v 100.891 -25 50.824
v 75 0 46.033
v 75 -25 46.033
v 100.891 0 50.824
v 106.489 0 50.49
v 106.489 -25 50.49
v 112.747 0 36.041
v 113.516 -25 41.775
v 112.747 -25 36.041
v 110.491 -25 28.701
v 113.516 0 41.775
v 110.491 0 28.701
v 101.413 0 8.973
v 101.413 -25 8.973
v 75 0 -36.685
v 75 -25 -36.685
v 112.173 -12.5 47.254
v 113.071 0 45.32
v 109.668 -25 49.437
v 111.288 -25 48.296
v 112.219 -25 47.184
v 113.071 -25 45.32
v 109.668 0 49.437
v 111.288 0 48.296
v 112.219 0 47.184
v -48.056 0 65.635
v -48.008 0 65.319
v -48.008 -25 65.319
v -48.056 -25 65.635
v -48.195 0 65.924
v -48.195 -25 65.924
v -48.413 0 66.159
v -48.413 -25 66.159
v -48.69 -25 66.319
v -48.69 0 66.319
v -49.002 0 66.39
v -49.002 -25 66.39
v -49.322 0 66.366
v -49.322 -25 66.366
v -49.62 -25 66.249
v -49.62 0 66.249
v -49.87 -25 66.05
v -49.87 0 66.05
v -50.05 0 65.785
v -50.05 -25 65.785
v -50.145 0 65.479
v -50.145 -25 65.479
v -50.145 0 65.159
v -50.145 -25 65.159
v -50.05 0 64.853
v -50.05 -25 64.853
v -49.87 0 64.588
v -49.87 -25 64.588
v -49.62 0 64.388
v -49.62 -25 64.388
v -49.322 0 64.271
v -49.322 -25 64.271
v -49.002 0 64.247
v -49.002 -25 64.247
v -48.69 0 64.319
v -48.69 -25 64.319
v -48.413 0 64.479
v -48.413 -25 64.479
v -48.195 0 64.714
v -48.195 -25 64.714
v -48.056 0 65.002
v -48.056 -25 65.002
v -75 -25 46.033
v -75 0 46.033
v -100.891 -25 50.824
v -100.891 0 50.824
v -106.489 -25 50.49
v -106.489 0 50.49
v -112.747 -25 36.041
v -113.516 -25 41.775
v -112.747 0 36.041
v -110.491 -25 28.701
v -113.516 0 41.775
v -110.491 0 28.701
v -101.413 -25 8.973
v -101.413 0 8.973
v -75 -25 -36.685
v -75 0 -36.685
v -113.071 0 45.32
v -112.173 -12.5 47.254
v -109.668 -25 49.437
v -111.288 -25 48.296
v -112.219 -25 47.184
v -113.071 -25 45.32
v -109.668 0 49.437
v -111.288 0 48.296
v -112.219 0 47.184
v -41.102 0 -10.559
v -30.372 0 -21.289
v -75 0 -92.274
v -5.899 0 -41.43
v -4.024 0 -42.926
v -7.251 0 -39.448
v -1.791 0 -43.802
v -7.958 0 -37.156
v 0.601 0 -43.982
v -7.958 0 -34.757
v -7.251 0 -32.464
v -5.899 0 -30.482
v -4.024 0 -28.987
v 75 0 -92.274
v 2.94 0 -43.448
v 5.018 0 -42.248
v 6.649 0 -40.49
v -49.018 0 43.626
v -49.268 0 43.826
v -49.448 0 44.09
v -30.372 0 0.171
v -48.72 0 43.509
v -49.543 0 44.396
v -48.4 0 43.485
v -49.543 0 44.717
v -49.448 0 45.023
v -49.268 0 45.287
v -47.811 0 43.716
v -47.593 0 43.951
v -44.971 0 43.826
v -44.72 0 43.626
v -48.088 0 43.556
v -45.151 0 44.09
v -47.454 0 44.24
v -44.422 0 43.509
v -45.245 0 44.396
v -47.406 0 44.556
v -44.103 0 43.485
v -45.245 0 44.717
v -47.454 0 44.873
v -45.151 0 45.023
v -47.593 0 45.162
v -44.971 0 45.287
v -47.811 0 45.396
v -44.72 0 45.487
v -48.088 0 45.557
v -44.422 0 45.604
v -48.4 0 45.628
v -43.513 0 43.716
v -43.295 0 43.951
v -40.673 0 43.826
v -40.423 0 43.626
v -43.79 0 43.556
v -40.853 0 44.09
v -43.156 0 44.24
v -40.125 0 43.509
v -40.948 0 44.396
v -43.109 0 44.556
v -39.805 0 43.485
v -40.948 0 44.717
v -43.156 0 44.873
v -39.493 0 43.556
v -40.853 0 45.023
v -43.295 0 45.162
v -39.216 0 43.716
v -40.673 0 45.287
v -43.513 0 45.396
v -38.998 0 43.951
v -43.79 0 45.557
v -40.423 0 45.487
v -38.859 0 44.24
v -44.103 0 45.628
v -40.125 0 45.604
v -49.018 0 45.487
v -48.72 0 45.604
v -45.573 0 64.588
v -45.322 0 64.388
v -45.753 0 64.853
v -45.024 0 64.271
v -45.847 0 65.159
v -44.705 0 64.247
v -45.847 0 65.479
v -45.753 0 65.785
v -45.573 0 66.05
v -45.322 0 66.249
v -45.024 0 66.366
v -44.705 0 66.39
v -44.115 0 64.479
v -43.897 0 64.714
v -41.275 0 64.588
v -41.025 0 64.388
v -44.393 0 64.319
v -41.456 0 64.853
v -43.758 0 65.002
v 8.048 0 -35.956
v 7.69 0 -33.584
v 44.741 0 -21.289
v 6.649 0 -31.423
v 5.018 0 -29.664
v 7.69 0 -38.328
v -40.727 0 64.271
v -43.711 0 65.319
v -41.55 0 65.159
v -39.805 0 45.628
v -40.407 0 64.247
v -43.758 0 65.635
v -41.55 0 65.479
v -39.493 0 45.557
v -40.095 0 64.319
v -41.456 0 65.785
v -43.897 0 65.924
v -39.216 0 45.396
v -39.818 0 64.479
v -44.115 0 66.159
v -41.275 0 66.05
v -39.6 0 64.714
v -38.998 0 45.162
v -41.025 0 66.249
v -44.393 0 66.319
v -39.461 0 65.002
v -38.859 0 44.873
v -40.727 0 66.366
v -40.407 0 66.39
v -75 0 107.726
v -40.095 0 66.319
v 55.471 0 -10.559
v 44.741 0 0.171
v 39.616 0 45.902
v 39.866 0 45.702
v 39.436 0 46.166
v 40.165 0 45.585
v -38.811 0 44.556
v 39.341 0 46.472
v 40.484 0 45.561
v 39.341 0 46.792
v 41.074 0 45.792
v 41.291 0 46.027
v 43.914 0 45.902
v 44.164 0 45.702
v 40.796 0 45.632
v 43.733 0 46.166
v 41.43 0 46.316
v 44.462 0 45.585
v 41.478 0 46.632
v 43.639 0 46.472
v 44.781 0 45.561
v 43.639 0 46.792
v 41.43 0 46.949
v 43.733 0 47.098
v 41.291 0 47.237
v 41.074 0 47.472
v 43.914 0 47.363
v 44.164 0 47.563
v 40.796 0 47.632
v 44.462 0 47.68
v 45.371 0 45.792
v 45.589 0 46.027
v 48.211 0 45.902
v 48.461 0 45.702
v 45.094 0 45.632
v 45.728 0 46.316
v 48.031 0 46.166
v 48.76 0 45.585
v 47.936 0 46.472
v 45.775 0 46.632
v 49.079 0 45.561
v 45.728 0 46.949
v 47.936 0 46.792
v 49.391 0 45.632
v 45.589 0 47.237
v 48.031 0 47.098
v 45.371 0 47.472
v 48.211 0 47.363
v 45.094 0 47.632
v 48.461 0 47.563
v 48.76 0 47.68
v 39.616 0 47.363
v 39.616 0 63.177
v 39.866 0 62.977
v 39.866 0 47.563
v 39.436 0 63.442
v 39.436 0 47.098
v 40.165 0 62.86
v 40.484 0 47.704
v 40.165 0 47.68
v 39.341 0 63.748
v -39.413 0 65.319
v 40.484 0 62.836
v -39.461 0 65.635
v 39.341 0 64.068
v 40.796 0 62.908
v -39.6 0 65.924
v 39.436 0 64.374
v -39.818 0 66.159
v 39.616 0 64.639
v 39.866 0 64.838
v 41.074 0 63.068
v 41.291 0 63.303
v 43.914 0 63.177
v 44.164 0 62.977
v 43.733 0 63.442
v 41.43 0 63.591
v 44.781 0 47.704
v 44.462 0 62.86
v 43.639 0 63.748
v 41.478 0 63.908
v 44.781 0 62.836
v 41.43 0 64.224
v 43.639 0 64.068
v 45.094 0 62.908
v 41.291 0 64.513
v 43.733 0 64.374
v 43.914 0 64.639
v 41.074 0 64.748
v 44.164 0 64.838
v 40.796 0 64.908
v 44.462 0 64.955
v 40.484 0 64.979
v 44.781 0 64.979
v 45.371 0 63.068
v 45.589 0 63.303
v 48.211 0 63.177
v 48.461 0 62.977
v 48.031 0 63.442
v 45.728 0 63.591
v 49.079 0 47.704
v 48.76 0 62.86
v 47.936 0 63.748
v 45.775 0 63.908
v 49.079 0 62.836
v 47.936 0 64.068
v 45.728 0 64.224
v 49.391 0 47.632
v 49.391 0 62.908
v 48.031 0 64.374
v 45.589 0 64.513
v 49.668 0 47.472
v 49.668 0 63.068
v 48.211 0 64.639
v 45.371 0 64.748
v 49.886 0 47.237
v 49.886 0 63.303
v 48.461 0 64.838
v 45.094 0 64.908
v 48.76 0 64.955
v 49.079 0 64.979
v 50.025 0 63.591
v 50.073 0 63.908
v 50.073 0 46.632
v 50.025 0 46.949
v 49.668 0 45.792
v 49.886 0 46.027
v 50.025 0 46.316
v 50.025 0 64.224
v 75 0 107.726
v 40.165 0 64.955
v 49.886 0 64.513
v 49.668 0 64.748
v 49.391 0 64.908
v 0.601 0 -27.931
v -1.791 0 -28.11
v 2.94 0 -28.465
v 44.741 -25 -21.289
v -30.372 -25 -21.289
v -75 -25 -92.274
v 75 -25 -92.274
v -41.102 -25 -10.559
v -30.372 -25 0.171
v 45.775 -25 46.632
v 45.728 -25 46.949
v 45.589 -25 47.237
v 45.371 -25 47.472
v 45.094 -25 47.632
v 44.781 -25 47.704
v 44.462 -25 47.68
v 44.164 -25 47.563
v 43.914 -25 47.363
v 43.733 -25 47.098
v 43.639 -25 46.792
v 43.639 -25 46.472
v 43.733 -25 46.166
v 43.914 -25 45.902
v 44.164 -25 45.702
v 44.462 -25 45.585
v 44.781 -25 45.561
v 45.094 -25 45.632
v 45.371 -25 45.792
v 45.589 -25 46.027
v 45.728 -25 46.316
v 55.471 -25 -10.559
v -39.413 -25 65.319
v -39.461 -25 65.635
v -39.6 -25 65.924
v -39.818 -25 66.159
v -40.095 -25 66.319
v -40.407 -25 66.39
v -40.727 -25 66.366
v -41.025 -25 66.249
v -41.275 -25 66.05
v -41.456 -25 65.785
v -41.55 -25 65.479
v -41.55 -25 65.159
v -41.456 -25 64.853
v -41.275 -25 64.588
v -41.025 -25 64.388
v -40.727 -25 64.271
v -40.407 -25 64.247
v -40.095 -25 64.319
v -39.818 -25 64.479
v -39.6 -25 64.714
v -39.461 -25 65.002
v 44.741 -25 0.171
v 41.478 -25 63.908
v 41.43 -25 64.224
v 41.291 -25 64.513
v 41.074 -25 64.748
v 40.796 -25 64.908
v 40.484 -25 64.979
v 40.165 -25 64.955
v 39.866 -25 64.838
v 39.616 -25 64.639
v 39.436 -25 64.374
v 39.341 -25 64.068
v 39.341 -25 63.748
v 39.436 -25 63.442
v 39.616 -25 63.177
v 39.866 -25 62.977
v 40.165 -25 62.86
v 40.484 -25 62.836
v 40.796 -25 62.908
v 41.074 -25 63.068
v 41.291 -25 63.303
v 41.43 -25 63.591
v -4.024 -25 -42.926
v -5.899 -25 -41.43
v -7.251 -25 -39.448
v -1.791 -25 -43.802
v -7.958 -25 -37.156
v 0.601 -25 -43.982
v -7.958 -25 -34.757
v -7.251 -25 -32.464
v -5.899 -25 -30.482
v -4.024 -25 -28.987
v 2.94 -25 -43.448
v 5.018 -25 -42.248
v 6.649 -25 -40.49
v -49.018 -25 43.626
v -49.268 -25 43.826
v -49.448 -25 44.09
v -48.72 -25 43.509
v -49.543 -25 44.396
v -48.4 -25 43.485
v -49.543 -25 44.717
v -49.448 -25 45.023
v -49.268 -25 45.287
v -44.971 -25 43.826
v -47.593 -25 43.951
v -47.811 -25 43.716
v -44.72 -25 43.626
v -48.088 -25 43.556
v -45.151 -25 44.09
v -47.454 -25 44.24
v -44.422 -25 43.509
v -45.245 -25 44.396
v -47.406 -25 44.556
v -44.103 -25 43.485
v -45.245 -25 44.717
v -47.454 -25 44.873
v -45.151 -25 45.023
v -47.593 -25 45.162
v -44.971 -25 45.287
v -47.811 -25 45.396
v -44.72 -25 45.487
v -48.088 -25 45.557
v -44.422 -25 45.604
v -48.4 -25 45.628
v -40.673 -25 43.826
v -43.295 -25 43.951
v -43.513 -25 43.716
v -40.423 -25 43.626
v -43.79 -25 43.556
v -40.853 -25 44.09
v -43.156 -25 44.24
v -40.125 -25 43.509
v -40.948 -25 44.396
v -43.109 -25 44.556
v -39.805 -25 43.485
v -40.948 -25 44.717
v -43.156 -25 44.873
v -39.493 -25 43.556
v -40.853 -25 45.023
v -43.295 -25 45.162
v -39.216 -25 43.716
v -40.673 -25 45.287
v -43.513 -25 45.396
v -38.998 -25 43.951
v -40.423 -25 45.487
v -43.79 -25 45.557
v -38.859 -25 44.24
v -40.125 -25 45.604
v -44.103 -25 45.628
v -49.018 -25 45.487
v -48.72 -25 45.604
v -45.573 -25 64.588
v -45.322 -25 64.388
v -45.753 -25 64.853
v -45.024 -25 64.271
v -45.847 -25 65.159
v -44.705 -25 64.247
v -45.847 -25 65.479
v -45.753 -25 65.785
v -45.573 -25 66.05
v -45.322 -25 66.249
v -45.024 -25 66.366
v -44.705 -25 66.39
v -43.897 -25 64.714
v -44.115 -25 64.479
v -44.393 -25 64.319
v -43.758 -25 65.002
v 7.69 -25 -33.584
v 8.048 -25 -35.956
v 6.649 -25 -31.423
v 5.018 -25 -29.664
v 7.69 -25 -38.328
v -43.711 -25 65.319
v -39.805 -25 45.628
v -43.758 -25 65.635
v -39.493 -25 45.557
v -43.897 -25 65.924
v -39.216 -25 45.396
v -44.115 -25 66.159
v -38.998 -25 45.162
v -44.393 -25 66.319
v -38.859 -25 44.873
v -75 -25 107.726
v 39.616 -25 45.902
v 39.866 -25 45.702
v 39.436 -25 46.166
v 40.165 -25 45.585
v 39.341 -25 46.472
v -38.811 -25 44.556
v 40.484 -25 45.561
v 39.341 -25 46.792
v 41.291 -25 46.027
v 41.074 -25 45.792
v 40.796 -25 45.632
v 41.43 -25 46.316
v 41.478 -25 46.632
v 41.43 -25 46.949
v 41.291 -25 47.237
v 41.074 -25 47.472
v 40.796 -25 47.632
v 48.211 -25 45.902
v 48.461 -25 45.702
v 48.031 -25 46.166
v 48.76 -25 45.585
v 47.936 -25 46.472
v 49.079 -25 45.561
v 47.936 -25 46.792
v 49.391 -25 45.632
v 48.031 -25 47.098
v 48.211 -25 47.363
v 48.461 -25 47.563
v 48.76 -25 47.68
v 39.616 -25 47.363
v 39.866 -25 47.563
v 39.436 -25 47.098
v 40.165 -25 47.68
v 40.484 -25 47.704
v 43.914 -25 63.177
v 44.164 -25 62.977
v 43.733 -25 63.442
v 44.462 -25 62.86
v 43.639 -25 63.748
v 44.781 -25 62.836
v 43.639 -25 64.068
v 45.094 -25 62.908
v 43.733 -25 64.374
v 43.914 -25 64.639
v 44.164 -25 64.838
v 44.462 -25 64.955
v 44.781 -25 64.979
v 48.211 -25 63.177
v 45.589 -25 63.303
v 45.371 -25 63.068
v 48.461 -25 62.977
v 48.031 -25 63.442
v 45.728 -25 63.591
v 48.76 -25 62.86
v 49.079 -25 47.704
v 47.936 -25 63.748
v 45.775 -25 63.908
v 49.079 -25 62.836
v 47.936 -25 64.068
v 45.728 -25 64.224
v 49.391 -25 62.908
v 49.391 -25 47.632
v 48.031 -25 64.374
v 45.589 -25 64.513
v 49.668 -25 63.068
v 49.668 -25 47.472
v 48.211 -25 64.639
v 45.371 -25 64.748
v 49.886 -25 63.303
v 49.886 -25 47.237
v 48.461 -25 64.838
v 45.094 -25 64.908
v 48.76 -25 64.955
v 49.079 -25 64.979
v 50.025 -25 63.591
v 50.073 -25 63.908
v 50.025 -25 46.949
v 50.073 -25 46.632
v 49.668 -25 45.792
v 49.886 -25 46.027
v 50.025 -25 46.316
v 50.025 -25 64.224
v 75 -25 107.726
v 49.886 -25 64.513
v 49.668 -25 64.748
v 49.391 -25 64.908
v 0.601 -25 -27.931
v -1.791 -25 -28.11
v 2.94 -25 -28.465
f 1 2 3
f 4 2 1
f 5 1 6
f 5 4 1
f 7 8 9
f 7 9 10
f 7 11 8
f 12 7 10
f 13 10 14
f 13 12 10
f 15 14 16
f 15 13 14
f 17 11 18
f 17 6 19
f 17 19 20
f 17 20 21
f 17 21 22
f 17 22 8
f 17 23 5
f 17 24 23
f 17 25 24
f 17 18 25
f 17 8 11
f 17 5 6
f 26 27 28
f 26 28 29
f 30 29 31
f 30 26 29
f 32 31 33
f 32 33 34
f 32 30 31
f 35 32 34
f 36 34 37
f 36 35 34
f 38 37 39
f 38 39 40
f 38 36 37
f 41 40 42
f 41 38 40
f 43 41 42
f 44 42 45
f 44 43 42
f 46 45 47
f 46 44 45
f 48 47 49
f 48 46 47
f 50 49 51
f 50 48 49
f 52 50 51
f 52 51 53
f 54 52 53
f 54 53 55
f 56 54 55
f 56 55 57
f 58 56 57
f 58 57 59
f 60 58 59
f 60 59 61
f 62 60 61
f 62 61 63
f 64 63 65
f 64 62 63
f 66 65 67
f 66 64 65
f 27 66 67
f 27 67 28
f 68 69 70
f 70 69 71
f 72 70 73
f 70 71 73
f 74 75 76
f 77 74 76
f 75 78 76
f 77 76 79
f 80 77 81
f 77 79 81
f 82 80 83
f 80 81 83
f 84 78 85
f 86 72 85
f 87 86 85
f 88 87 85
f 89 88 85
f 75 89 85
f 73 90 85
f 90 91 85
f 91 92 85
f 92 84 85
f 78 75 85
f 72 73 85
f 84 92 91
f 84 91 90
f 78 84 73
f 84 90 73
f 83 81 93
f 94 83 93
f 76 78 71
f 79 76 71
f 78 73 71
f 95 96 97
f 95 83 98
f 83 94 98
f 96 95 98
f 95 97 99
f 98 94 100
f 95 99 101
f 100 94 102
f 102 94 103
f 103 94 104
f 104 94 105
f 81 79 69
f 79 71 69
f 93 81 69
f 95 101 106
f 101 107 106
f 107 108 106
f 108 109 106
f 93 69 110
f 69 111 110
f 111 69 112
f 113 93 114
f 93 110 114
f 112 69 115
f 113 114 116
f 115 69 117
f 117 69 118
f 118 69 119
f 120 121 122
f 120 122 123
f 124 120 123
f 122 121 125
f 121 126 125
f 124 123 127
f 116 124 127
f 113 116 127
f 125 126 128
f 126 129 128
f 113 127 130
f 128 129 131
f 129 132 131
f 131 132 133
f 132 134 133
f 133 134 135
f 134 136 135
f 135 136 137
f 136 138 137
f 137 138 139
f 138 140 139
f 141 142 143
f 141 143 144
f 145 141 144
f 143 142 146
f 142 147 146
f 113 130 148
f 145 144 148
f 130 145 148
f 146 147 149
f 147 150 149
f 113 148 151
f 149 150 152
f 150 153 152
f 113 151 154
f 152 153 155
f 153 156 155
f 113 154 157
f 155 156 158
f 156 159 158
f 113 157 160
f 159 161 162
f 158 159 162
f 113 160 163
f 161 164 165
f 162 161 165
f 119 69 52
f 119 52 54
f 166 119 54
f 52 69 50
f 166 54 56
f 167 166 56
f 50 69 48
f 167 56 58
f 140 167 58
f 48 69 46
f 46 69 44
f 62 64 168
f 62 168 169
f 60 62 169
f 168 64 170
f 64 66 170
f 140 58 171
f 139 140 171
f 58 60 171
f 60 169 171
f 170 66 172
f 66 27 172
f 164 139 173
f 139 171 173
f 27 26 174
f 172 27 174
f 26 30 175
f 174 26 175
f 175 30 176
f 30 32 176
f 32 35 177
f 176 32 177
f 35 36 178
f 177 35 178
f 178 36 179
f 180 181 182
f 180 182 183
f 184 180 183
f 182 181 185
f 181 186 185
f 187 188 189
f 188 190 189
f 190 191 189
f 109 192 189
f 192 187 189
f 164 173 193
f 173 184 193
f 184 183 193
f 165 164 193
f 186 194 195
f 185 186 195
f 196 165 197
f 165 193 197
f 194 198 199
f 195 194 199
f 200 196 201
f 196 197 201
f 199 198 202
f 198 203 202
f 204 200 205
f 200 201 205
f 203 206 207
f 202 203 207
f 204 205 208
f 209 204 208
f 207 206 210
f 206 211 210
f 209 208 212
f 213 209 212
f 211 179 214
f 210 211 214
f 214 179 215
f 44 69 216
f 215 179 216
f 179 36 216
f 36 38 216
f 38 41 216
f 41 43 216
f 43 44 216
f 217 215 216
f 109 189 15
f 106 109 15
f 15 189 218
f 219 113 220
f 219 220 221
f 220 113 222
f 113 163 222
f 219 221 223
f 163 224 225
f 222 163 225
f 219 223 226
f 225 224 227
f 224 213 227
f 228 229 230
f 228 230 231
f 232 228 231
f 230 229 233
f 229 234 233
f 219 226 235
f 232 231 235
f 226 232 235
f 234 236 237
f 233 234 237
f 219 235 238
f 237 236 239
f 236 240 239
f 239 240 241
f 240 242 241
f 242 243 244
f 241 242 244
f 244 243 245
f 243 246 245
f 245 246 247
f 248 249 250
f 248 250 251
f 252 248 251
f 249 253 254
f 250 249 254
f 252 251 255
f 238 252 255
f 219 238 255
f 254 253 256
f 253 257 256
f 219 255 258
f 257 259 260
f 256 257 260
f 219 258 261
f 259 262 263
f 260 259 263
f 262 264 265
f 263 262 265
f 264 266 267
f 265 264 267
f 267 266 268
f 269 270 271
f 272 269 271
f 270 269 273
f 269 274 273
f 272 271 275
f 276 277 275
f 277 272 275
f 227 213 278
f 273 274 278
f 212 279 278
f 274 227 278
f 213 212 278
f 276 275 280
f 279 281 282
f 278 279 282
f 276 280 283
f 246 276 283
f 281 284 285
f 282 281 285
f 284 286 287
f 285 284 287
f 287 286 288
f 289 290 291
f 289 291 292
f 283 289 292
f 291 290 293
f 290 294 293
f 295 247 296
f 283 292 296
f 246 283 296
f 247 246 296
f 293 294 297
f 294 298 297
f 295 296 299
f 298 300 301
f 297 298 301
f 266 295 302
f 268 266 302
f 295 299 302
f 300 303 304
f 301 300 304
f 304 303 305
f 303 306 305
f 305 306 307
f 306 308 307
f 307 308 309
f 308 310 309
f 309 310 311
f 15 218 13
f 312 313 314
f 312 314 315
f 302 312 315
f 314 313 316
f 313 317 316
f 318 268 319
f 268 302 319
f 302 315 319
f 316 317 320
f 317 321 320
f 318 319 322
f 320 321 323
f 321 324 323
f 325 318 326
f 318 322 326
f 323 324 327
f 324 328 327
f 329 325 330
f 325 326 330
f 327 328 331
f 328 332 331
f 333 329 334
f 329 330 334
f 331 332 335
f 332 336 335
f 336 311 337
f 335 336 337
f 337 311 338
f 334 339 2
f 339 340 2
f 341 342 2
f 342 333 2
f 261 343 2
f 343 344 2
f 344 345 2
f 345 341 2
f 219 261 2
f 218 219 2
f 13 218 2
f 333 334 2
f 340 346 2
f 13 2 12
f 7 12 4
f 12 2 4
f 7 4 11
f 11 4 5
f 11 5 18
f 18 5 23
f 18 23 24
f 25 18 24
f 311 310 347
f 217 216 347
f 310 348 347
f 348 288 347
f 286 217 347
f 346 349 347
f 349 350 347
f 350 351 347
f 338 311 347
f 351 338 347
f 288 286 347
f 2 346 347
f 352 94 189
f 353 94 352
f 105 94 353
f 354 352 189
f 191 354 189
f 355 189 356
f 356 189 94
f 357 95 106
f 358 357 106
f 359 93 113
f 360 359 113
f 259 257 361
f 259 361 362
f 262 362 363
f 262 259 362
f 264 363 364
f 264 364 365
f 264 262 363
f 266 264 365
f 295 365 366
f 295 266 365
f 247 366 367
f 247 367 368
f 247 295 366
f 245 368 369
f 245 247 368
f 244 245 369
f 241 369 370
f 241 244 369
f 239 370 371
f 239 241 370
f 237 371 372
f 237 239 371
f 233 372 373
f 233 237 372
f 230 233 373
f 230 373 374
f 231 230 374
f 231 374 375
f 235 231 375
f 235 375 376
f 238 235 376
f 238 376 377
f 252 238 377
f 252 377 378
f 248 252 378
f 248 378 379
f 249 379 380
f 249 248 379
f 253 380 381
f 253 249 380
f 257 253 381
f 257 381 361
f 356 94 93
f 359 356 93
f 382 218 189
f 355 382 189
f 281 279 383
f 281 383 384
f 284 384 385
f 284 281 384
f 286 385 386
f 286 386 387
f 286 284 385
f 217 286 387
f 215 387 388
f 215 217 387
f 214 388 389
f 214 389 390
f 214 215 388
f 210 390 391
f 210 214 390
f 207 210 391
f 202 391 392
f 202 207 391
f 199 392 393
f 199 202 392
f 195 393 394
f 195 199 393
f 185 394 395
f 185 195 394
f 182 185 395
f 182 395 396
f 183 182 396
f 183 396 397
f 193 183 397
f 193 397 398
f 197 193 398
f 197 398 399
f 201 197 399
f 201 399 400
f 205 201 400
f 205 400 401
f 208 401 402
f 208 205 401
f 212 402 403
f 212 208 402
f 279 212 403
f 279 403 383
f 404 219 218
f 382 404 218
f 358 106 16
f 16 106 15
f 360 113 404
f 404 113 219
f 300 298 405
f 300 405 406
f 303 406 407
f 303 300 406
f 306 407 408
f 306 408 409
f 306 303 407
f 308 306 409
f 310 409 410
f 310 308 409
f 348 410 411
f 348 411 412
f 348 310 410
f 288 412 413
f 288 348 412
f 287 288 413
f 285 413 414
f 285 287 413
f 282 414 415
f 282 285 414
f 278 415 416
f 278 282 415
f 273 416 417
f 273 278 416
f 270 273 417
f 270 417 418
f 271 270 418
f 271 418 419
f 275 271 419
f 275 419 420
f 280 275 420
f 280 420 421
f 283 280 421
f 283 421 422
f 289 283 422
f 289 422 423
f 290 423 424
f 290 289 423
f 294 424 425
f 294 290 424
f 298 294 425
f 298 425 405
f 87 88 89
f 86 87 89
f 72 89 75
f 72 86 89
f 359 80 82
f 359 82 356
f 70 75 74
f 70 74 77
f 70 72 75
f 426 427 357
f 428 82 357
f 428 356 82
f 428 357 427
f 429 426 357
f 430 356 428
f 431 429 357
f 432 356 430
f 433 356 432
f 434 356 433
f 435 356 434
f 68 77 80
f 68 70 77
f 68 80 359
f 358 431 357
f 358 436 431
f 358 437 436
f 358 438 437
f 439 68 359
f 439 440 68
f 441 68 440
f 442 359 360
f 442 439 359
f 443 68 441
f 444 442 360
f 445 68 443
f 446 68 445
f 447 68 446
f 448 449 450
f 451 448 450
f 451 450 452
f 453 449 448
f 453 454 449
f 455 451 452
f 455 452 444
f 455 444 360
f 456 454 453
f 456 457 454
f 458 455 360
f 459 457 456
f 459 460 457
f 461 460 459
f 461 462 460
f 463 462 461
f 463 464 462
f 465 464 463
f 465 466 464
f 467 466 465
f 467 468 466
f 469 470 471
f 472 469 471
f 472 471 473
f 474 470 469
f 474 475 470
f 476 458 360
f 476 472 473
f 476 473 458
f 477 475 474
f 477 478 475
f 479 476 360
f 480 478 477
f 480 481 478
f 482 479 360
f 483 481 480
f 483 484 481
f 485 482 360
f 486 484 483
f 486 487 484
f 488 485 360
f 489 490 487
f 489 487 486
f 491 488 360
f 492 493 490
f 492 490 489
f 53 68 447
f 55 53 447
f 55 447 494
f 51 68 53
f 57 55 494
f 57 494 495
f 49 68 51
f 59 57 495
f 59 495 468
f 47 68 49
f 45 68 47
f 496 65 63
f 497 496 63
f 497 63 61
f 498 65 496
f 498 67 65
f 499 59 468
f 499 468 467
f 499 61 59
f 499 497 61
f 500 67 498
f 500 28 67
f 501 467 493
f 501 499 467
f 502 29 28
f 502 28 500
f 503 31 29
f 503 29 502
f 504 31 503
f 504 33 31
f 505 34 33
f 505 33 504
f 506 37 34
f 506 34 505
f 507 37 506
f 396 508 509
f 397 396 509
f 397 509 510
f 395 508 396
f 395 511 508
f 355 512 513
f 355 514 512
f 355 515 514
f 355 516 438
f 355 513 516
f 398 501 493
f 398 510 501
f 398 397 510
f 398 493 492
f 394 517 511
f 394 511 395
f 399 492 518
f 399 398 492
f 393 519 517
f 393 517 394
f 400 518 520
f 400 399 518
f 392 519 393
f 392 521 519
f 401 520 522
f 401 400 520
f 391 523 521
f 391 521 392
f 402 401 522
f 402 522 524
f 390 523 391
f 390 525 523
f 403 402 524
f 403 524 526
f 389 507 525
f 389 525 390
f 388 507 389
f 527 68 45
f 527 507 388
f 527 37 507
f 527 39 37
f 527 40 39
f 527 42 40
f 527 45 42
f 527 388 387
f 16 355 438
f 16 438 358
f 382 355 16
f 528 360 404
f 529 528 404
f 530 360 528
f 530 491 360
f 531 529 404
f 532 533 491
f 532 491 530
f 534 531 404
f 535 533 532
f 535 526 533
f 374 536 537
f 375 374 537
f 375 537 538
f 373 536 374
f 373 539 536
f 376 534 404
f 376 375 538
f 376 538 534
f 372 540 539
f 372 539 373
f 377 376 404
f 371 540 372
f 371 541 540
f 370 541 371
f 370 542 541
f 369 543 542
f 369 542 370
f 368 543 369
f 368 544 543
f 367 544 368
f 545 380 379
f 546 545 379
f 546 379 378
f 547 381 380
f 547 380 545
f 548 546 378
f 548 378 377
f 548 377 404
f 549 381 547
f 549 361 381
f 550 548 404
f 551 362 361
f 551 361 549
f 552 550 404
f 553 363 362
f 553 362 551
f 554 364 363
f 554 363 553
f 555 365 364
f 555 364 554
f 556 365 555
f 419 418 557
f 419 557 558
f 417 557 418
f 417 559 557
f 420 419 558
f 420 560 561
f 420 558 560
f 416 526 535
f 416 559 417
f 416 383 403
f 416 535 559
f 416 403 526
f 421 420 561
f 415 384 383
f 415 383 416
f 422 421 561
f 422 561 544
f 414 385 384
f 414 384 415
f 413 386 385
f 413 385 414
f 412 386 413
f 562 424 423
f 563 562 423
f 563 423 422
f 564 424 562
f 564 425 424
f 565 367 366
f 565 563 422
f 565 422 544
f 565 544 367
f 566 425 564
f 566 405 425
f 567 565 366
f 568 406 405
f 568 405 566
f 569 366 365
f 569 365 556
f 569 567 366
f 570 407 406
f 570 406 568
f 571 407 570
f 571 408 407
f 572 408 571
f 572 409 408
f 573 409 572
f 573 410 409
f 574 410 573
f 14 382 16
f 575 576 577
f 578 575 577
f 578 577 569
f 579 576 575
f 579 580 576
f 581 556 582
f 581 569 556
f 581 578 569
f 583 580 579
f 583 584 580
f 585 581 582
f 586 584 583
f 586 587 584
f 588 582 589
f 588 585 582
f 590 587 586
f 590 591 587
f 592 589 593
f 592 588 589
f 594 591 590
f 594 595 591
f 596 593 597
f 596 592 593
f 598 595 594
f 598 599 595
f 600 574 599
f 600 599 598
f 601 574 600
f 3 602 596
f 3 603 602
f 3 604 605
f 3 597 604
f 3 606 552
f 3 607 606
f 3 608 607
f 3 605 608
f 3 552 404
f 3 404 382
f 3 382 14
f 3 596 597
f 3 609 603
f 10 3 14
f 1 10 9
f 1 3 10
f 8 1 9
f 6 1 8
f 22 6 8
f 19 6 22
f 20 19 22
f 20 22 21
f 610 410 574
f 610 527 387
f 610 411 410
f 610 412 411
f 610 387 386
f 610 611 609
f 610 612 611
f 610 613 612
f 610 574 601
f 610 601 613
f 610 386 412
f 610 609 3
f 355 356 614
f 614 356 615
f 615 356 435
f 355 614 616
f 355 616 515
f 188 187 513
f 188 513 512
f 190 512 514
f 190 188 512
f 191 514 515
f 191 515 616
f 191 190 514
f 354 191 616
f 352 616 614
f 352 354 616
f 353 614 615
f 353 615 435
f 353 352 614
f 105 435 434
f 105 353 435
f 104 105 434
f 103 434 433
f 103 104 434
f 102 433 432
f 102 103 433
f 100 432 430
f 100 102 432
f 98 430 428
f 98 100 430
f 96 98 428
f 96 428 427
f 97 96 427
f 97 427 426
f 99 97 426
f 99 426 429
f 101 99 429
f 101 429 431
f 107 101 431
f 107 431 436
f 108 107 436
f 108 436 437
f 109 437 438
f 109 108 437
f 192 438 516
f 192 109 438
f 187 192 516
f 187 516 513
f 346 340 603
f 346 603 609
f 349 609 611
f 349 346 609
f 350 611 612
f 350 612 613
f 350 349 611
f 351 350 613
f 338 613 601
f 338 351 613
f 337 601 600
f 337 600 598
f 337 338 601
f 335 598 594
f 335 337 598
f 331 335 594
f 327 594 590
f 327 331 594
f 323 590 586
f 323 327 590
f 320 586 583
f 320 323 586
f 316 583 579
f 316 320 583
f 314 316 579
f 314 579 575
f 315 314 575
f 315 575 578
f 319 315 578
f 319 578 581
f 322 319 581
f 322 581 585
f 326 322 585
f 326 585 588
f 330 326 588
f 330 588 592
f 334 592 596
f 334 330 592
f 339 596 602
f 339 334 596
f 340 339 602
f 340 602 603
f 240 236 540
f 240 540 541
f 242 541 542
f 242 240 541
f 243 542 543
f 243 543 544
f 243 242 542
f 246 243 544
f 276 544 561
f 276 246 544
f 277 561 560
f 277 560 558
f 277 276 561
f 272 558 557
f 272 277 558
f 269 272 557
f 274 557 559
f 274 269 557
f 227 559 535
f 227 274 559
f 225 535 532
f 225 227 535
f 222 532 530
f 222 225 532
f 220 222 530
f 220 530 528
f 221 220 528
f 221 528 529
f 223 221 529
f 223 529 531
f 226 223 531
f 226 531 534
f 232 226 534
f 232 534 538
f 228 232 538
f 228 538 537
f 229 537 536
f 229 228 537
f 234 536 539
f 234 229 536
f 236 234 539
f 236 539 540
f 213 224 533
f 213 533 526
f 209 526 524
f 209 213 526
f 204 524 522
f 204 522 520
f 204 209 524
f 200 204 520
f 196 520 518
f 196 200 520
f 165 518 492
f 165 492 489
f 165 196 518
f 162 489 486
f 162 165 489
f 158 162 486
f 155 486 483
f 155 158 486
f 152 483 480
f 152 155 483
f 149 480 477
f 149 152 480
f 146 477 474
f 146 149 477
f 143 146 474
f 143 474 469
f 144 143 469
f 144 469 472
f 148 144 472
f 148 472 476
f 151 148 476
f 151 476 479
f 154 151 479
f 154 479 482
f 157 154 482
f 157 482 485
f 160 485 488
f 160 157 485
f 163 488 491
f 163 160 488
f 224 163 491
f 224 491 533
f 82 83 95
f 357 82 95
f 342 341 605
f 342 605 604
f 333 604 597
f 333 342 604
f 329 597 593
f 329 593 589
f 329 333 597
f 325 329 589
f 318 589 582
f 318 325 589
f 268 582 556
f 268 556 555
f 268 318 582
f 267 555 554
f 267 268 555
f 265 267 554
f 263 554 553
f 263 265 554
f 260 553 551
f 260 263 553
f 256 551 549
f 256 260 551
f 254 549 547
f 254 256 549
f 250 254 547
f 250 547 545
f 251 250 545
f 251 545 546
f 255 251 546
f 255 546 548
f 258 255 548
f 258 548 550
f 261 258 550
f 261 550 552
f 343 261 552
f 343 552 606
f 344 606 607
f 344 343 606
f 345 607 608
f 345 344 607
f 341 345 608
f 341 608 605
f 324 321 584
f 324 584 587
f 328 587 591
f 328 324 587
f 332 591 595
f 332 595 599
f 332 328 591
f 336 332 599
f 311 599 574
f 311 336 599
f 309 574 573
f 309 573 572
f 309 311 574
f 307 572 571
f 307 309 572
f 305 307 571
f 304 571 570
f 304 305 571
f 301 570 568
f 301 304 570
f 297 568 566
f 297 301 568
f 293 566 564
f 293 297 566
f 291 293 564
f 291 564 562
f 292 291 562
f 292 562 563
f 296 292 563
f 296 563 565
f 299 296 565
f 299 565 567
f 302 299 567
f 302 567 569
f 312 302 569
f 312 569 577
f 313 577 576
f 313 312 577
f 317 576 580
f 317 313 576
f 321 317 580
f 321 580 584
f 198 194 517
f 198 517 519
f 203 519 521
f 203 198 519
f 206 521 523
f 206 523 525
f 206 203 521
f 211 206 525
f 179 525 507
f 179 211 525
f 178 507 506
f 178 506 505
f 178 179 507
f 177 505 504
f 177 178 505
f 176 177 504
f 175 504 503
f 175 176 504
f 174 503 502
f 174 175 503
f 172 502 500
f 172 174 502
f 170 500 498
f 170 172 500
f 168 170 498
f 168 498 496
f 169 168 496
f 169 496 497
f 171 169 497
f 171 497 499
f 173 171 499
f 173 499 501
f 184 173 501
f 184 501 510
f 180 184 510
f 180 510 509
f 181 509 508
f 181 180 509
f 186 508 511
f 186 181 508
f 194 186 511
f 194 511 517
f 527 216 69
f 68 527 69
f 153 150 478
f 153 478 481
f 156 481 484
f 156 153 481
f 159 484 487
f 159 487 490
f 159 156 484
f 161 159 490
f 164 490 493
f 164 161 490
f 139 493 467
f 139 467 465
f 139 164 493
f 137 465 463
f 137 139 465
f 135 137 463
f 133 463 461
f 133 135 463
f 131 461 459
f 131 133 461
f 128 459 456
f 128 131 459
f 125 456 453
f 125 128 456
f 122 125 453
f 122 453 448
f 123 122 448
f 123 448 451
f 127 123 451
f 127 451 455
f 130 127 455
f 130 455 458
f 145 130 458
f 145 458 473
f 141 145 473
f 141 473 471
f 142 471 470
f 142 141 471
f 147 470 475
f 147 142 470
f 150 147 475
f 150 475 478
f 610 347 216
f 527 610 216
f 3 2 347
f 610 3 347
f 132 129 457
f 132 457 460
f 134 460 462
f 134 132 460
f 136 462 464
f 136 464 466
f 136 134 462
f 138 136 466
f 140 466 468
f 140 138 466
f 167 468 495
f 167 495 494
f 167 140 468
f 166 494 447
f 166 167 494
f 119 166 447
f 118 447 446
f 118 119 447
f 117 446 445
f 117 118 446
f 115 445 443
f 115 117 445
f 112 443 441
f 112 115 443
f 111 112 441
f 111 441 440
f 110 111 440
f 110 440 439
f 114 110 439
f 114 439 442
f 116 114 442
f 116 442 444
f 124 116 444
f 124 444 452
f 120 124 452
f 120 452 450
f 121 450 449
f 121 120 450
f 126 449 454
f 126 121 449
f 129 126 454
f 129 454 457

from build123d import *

# Parameters (mm, degrees)
F0_R     = 8.047855898
F0_R_2   = 1.0743657774
F1_DEPTH = 25


# Not quite as in the source:
# - the program builds the solid bodies; features that only make, move or delete a surface that nothing else refers to are left out


with BuildPart() as f1:
    # F0 (on Front) → F1 (new body)
    with BuildSketch(Plane.XZ):
        Polygon((75, 46.0328937352), (75, 107.7262044382), (-75, 107.7262044382), (-75, 46.0328937352), (-75, -36.6851300407), (-75, -92.2737955618), (75, -92.2737955618), (75, -36.6851300407), align=None)
        with Locations((0, -35.9561647287)):
            Circle(F0_R, mode=Mode.SUBTRACT)
        Polygon((44.7407775558, -21.2889015805), (-30.3720422538, -21.2889015805), (-41.1018976561, -10.5590461782), (-30.3720422538, 0.1708092241), (44.7407775558, 0.1708092241), (55.4706329581, -10.5590461782), align=None, mode=Mode.SUBTRACT)
        with Locations((-48.4804458196, 44.5564172655)):
            Circle(F0_R_2, mode=Mode.SUBTRACT)
        with Locations((-44.1829827099, 44.5564172655)):
            Circle(F0_R_2, mode=Mode.SUBTRACT)
        with Locations((-39.8855196001, 44.5564172655)):
            Circle(F0_R_2, mode=Mode.SUBTRACT)
        with Locations((-49.0825107104, 65.3187614809)):
            Circle(F0_R_2, mode=Mode.SUBTRACT)
        with Locations((-44.7850476006, 65.3187614809)):
            Circle(F0_R_2, mode=Mode.SUBTRACT)
        with Locations((-40.4875844908, 65.3187614809)):
            Circle(F0_R_2, mode=Mode.SUBTRACT)
        with Locations((40.4036690891, 46.6322604282)):
            Circle(F0_R_2, mode=Mode.SUBTRACT)
        with Locations((44.7011321989, 46.6322604282)):
            Circle(F0_R_2, mode=Mode.SUBTRACT)
        with Locations((48.9985953086, 46.6322604282)):
            Circle(F0_R_2, mode=Mode.SUBTRACT)
        with Locations((40.4036690891, 63.9077951499)):
            Circle(F0_R_2, mode=Mode.SUBTRACT)
        with Locations((44.7011321989, 63.9077951499)):
            Circle(F0_R_2, mode=Mode.SUBTRACT)
        with Locations((48.9985953086, 63.9077951499)):
            Circle(F0_R_2, mode=Mode.SUBTRACT)
        with BuildLine():
            add(Edge.make_bspline(
                [(75, 46.0328937352), (91.3344780181, 49.9824236443), (133.3315352118, 60.1369344463), (97.1245297955, 0.0384474003), (75, -36.6851300407)],
                knots=[0, 0, 0, 0, 0.3889433953, 1, 1, 1, 1], degree=3))
            Line((75, 46.0328937352), (75, -36.6851300407))
        make_face()
        with BuildLine():
            Line((-75, -36.6851300407), (-75, 46.0328937352))
            add(Edge.make_bspline(
                [(-75, 46.0328937352), (-91.3344780181, 49.9824236443), (-133.3315352118, 60.1369344463), (-97.1245297955, 0.0384474003), (-75, -36.6851300407)],
                knots=[0, 0, 0, 0, 0.3889433953, 1, 1, 1, 1], degree=3))
        make_face()
    extrude(amount=F1_DEPTH)


solid = f1.part
